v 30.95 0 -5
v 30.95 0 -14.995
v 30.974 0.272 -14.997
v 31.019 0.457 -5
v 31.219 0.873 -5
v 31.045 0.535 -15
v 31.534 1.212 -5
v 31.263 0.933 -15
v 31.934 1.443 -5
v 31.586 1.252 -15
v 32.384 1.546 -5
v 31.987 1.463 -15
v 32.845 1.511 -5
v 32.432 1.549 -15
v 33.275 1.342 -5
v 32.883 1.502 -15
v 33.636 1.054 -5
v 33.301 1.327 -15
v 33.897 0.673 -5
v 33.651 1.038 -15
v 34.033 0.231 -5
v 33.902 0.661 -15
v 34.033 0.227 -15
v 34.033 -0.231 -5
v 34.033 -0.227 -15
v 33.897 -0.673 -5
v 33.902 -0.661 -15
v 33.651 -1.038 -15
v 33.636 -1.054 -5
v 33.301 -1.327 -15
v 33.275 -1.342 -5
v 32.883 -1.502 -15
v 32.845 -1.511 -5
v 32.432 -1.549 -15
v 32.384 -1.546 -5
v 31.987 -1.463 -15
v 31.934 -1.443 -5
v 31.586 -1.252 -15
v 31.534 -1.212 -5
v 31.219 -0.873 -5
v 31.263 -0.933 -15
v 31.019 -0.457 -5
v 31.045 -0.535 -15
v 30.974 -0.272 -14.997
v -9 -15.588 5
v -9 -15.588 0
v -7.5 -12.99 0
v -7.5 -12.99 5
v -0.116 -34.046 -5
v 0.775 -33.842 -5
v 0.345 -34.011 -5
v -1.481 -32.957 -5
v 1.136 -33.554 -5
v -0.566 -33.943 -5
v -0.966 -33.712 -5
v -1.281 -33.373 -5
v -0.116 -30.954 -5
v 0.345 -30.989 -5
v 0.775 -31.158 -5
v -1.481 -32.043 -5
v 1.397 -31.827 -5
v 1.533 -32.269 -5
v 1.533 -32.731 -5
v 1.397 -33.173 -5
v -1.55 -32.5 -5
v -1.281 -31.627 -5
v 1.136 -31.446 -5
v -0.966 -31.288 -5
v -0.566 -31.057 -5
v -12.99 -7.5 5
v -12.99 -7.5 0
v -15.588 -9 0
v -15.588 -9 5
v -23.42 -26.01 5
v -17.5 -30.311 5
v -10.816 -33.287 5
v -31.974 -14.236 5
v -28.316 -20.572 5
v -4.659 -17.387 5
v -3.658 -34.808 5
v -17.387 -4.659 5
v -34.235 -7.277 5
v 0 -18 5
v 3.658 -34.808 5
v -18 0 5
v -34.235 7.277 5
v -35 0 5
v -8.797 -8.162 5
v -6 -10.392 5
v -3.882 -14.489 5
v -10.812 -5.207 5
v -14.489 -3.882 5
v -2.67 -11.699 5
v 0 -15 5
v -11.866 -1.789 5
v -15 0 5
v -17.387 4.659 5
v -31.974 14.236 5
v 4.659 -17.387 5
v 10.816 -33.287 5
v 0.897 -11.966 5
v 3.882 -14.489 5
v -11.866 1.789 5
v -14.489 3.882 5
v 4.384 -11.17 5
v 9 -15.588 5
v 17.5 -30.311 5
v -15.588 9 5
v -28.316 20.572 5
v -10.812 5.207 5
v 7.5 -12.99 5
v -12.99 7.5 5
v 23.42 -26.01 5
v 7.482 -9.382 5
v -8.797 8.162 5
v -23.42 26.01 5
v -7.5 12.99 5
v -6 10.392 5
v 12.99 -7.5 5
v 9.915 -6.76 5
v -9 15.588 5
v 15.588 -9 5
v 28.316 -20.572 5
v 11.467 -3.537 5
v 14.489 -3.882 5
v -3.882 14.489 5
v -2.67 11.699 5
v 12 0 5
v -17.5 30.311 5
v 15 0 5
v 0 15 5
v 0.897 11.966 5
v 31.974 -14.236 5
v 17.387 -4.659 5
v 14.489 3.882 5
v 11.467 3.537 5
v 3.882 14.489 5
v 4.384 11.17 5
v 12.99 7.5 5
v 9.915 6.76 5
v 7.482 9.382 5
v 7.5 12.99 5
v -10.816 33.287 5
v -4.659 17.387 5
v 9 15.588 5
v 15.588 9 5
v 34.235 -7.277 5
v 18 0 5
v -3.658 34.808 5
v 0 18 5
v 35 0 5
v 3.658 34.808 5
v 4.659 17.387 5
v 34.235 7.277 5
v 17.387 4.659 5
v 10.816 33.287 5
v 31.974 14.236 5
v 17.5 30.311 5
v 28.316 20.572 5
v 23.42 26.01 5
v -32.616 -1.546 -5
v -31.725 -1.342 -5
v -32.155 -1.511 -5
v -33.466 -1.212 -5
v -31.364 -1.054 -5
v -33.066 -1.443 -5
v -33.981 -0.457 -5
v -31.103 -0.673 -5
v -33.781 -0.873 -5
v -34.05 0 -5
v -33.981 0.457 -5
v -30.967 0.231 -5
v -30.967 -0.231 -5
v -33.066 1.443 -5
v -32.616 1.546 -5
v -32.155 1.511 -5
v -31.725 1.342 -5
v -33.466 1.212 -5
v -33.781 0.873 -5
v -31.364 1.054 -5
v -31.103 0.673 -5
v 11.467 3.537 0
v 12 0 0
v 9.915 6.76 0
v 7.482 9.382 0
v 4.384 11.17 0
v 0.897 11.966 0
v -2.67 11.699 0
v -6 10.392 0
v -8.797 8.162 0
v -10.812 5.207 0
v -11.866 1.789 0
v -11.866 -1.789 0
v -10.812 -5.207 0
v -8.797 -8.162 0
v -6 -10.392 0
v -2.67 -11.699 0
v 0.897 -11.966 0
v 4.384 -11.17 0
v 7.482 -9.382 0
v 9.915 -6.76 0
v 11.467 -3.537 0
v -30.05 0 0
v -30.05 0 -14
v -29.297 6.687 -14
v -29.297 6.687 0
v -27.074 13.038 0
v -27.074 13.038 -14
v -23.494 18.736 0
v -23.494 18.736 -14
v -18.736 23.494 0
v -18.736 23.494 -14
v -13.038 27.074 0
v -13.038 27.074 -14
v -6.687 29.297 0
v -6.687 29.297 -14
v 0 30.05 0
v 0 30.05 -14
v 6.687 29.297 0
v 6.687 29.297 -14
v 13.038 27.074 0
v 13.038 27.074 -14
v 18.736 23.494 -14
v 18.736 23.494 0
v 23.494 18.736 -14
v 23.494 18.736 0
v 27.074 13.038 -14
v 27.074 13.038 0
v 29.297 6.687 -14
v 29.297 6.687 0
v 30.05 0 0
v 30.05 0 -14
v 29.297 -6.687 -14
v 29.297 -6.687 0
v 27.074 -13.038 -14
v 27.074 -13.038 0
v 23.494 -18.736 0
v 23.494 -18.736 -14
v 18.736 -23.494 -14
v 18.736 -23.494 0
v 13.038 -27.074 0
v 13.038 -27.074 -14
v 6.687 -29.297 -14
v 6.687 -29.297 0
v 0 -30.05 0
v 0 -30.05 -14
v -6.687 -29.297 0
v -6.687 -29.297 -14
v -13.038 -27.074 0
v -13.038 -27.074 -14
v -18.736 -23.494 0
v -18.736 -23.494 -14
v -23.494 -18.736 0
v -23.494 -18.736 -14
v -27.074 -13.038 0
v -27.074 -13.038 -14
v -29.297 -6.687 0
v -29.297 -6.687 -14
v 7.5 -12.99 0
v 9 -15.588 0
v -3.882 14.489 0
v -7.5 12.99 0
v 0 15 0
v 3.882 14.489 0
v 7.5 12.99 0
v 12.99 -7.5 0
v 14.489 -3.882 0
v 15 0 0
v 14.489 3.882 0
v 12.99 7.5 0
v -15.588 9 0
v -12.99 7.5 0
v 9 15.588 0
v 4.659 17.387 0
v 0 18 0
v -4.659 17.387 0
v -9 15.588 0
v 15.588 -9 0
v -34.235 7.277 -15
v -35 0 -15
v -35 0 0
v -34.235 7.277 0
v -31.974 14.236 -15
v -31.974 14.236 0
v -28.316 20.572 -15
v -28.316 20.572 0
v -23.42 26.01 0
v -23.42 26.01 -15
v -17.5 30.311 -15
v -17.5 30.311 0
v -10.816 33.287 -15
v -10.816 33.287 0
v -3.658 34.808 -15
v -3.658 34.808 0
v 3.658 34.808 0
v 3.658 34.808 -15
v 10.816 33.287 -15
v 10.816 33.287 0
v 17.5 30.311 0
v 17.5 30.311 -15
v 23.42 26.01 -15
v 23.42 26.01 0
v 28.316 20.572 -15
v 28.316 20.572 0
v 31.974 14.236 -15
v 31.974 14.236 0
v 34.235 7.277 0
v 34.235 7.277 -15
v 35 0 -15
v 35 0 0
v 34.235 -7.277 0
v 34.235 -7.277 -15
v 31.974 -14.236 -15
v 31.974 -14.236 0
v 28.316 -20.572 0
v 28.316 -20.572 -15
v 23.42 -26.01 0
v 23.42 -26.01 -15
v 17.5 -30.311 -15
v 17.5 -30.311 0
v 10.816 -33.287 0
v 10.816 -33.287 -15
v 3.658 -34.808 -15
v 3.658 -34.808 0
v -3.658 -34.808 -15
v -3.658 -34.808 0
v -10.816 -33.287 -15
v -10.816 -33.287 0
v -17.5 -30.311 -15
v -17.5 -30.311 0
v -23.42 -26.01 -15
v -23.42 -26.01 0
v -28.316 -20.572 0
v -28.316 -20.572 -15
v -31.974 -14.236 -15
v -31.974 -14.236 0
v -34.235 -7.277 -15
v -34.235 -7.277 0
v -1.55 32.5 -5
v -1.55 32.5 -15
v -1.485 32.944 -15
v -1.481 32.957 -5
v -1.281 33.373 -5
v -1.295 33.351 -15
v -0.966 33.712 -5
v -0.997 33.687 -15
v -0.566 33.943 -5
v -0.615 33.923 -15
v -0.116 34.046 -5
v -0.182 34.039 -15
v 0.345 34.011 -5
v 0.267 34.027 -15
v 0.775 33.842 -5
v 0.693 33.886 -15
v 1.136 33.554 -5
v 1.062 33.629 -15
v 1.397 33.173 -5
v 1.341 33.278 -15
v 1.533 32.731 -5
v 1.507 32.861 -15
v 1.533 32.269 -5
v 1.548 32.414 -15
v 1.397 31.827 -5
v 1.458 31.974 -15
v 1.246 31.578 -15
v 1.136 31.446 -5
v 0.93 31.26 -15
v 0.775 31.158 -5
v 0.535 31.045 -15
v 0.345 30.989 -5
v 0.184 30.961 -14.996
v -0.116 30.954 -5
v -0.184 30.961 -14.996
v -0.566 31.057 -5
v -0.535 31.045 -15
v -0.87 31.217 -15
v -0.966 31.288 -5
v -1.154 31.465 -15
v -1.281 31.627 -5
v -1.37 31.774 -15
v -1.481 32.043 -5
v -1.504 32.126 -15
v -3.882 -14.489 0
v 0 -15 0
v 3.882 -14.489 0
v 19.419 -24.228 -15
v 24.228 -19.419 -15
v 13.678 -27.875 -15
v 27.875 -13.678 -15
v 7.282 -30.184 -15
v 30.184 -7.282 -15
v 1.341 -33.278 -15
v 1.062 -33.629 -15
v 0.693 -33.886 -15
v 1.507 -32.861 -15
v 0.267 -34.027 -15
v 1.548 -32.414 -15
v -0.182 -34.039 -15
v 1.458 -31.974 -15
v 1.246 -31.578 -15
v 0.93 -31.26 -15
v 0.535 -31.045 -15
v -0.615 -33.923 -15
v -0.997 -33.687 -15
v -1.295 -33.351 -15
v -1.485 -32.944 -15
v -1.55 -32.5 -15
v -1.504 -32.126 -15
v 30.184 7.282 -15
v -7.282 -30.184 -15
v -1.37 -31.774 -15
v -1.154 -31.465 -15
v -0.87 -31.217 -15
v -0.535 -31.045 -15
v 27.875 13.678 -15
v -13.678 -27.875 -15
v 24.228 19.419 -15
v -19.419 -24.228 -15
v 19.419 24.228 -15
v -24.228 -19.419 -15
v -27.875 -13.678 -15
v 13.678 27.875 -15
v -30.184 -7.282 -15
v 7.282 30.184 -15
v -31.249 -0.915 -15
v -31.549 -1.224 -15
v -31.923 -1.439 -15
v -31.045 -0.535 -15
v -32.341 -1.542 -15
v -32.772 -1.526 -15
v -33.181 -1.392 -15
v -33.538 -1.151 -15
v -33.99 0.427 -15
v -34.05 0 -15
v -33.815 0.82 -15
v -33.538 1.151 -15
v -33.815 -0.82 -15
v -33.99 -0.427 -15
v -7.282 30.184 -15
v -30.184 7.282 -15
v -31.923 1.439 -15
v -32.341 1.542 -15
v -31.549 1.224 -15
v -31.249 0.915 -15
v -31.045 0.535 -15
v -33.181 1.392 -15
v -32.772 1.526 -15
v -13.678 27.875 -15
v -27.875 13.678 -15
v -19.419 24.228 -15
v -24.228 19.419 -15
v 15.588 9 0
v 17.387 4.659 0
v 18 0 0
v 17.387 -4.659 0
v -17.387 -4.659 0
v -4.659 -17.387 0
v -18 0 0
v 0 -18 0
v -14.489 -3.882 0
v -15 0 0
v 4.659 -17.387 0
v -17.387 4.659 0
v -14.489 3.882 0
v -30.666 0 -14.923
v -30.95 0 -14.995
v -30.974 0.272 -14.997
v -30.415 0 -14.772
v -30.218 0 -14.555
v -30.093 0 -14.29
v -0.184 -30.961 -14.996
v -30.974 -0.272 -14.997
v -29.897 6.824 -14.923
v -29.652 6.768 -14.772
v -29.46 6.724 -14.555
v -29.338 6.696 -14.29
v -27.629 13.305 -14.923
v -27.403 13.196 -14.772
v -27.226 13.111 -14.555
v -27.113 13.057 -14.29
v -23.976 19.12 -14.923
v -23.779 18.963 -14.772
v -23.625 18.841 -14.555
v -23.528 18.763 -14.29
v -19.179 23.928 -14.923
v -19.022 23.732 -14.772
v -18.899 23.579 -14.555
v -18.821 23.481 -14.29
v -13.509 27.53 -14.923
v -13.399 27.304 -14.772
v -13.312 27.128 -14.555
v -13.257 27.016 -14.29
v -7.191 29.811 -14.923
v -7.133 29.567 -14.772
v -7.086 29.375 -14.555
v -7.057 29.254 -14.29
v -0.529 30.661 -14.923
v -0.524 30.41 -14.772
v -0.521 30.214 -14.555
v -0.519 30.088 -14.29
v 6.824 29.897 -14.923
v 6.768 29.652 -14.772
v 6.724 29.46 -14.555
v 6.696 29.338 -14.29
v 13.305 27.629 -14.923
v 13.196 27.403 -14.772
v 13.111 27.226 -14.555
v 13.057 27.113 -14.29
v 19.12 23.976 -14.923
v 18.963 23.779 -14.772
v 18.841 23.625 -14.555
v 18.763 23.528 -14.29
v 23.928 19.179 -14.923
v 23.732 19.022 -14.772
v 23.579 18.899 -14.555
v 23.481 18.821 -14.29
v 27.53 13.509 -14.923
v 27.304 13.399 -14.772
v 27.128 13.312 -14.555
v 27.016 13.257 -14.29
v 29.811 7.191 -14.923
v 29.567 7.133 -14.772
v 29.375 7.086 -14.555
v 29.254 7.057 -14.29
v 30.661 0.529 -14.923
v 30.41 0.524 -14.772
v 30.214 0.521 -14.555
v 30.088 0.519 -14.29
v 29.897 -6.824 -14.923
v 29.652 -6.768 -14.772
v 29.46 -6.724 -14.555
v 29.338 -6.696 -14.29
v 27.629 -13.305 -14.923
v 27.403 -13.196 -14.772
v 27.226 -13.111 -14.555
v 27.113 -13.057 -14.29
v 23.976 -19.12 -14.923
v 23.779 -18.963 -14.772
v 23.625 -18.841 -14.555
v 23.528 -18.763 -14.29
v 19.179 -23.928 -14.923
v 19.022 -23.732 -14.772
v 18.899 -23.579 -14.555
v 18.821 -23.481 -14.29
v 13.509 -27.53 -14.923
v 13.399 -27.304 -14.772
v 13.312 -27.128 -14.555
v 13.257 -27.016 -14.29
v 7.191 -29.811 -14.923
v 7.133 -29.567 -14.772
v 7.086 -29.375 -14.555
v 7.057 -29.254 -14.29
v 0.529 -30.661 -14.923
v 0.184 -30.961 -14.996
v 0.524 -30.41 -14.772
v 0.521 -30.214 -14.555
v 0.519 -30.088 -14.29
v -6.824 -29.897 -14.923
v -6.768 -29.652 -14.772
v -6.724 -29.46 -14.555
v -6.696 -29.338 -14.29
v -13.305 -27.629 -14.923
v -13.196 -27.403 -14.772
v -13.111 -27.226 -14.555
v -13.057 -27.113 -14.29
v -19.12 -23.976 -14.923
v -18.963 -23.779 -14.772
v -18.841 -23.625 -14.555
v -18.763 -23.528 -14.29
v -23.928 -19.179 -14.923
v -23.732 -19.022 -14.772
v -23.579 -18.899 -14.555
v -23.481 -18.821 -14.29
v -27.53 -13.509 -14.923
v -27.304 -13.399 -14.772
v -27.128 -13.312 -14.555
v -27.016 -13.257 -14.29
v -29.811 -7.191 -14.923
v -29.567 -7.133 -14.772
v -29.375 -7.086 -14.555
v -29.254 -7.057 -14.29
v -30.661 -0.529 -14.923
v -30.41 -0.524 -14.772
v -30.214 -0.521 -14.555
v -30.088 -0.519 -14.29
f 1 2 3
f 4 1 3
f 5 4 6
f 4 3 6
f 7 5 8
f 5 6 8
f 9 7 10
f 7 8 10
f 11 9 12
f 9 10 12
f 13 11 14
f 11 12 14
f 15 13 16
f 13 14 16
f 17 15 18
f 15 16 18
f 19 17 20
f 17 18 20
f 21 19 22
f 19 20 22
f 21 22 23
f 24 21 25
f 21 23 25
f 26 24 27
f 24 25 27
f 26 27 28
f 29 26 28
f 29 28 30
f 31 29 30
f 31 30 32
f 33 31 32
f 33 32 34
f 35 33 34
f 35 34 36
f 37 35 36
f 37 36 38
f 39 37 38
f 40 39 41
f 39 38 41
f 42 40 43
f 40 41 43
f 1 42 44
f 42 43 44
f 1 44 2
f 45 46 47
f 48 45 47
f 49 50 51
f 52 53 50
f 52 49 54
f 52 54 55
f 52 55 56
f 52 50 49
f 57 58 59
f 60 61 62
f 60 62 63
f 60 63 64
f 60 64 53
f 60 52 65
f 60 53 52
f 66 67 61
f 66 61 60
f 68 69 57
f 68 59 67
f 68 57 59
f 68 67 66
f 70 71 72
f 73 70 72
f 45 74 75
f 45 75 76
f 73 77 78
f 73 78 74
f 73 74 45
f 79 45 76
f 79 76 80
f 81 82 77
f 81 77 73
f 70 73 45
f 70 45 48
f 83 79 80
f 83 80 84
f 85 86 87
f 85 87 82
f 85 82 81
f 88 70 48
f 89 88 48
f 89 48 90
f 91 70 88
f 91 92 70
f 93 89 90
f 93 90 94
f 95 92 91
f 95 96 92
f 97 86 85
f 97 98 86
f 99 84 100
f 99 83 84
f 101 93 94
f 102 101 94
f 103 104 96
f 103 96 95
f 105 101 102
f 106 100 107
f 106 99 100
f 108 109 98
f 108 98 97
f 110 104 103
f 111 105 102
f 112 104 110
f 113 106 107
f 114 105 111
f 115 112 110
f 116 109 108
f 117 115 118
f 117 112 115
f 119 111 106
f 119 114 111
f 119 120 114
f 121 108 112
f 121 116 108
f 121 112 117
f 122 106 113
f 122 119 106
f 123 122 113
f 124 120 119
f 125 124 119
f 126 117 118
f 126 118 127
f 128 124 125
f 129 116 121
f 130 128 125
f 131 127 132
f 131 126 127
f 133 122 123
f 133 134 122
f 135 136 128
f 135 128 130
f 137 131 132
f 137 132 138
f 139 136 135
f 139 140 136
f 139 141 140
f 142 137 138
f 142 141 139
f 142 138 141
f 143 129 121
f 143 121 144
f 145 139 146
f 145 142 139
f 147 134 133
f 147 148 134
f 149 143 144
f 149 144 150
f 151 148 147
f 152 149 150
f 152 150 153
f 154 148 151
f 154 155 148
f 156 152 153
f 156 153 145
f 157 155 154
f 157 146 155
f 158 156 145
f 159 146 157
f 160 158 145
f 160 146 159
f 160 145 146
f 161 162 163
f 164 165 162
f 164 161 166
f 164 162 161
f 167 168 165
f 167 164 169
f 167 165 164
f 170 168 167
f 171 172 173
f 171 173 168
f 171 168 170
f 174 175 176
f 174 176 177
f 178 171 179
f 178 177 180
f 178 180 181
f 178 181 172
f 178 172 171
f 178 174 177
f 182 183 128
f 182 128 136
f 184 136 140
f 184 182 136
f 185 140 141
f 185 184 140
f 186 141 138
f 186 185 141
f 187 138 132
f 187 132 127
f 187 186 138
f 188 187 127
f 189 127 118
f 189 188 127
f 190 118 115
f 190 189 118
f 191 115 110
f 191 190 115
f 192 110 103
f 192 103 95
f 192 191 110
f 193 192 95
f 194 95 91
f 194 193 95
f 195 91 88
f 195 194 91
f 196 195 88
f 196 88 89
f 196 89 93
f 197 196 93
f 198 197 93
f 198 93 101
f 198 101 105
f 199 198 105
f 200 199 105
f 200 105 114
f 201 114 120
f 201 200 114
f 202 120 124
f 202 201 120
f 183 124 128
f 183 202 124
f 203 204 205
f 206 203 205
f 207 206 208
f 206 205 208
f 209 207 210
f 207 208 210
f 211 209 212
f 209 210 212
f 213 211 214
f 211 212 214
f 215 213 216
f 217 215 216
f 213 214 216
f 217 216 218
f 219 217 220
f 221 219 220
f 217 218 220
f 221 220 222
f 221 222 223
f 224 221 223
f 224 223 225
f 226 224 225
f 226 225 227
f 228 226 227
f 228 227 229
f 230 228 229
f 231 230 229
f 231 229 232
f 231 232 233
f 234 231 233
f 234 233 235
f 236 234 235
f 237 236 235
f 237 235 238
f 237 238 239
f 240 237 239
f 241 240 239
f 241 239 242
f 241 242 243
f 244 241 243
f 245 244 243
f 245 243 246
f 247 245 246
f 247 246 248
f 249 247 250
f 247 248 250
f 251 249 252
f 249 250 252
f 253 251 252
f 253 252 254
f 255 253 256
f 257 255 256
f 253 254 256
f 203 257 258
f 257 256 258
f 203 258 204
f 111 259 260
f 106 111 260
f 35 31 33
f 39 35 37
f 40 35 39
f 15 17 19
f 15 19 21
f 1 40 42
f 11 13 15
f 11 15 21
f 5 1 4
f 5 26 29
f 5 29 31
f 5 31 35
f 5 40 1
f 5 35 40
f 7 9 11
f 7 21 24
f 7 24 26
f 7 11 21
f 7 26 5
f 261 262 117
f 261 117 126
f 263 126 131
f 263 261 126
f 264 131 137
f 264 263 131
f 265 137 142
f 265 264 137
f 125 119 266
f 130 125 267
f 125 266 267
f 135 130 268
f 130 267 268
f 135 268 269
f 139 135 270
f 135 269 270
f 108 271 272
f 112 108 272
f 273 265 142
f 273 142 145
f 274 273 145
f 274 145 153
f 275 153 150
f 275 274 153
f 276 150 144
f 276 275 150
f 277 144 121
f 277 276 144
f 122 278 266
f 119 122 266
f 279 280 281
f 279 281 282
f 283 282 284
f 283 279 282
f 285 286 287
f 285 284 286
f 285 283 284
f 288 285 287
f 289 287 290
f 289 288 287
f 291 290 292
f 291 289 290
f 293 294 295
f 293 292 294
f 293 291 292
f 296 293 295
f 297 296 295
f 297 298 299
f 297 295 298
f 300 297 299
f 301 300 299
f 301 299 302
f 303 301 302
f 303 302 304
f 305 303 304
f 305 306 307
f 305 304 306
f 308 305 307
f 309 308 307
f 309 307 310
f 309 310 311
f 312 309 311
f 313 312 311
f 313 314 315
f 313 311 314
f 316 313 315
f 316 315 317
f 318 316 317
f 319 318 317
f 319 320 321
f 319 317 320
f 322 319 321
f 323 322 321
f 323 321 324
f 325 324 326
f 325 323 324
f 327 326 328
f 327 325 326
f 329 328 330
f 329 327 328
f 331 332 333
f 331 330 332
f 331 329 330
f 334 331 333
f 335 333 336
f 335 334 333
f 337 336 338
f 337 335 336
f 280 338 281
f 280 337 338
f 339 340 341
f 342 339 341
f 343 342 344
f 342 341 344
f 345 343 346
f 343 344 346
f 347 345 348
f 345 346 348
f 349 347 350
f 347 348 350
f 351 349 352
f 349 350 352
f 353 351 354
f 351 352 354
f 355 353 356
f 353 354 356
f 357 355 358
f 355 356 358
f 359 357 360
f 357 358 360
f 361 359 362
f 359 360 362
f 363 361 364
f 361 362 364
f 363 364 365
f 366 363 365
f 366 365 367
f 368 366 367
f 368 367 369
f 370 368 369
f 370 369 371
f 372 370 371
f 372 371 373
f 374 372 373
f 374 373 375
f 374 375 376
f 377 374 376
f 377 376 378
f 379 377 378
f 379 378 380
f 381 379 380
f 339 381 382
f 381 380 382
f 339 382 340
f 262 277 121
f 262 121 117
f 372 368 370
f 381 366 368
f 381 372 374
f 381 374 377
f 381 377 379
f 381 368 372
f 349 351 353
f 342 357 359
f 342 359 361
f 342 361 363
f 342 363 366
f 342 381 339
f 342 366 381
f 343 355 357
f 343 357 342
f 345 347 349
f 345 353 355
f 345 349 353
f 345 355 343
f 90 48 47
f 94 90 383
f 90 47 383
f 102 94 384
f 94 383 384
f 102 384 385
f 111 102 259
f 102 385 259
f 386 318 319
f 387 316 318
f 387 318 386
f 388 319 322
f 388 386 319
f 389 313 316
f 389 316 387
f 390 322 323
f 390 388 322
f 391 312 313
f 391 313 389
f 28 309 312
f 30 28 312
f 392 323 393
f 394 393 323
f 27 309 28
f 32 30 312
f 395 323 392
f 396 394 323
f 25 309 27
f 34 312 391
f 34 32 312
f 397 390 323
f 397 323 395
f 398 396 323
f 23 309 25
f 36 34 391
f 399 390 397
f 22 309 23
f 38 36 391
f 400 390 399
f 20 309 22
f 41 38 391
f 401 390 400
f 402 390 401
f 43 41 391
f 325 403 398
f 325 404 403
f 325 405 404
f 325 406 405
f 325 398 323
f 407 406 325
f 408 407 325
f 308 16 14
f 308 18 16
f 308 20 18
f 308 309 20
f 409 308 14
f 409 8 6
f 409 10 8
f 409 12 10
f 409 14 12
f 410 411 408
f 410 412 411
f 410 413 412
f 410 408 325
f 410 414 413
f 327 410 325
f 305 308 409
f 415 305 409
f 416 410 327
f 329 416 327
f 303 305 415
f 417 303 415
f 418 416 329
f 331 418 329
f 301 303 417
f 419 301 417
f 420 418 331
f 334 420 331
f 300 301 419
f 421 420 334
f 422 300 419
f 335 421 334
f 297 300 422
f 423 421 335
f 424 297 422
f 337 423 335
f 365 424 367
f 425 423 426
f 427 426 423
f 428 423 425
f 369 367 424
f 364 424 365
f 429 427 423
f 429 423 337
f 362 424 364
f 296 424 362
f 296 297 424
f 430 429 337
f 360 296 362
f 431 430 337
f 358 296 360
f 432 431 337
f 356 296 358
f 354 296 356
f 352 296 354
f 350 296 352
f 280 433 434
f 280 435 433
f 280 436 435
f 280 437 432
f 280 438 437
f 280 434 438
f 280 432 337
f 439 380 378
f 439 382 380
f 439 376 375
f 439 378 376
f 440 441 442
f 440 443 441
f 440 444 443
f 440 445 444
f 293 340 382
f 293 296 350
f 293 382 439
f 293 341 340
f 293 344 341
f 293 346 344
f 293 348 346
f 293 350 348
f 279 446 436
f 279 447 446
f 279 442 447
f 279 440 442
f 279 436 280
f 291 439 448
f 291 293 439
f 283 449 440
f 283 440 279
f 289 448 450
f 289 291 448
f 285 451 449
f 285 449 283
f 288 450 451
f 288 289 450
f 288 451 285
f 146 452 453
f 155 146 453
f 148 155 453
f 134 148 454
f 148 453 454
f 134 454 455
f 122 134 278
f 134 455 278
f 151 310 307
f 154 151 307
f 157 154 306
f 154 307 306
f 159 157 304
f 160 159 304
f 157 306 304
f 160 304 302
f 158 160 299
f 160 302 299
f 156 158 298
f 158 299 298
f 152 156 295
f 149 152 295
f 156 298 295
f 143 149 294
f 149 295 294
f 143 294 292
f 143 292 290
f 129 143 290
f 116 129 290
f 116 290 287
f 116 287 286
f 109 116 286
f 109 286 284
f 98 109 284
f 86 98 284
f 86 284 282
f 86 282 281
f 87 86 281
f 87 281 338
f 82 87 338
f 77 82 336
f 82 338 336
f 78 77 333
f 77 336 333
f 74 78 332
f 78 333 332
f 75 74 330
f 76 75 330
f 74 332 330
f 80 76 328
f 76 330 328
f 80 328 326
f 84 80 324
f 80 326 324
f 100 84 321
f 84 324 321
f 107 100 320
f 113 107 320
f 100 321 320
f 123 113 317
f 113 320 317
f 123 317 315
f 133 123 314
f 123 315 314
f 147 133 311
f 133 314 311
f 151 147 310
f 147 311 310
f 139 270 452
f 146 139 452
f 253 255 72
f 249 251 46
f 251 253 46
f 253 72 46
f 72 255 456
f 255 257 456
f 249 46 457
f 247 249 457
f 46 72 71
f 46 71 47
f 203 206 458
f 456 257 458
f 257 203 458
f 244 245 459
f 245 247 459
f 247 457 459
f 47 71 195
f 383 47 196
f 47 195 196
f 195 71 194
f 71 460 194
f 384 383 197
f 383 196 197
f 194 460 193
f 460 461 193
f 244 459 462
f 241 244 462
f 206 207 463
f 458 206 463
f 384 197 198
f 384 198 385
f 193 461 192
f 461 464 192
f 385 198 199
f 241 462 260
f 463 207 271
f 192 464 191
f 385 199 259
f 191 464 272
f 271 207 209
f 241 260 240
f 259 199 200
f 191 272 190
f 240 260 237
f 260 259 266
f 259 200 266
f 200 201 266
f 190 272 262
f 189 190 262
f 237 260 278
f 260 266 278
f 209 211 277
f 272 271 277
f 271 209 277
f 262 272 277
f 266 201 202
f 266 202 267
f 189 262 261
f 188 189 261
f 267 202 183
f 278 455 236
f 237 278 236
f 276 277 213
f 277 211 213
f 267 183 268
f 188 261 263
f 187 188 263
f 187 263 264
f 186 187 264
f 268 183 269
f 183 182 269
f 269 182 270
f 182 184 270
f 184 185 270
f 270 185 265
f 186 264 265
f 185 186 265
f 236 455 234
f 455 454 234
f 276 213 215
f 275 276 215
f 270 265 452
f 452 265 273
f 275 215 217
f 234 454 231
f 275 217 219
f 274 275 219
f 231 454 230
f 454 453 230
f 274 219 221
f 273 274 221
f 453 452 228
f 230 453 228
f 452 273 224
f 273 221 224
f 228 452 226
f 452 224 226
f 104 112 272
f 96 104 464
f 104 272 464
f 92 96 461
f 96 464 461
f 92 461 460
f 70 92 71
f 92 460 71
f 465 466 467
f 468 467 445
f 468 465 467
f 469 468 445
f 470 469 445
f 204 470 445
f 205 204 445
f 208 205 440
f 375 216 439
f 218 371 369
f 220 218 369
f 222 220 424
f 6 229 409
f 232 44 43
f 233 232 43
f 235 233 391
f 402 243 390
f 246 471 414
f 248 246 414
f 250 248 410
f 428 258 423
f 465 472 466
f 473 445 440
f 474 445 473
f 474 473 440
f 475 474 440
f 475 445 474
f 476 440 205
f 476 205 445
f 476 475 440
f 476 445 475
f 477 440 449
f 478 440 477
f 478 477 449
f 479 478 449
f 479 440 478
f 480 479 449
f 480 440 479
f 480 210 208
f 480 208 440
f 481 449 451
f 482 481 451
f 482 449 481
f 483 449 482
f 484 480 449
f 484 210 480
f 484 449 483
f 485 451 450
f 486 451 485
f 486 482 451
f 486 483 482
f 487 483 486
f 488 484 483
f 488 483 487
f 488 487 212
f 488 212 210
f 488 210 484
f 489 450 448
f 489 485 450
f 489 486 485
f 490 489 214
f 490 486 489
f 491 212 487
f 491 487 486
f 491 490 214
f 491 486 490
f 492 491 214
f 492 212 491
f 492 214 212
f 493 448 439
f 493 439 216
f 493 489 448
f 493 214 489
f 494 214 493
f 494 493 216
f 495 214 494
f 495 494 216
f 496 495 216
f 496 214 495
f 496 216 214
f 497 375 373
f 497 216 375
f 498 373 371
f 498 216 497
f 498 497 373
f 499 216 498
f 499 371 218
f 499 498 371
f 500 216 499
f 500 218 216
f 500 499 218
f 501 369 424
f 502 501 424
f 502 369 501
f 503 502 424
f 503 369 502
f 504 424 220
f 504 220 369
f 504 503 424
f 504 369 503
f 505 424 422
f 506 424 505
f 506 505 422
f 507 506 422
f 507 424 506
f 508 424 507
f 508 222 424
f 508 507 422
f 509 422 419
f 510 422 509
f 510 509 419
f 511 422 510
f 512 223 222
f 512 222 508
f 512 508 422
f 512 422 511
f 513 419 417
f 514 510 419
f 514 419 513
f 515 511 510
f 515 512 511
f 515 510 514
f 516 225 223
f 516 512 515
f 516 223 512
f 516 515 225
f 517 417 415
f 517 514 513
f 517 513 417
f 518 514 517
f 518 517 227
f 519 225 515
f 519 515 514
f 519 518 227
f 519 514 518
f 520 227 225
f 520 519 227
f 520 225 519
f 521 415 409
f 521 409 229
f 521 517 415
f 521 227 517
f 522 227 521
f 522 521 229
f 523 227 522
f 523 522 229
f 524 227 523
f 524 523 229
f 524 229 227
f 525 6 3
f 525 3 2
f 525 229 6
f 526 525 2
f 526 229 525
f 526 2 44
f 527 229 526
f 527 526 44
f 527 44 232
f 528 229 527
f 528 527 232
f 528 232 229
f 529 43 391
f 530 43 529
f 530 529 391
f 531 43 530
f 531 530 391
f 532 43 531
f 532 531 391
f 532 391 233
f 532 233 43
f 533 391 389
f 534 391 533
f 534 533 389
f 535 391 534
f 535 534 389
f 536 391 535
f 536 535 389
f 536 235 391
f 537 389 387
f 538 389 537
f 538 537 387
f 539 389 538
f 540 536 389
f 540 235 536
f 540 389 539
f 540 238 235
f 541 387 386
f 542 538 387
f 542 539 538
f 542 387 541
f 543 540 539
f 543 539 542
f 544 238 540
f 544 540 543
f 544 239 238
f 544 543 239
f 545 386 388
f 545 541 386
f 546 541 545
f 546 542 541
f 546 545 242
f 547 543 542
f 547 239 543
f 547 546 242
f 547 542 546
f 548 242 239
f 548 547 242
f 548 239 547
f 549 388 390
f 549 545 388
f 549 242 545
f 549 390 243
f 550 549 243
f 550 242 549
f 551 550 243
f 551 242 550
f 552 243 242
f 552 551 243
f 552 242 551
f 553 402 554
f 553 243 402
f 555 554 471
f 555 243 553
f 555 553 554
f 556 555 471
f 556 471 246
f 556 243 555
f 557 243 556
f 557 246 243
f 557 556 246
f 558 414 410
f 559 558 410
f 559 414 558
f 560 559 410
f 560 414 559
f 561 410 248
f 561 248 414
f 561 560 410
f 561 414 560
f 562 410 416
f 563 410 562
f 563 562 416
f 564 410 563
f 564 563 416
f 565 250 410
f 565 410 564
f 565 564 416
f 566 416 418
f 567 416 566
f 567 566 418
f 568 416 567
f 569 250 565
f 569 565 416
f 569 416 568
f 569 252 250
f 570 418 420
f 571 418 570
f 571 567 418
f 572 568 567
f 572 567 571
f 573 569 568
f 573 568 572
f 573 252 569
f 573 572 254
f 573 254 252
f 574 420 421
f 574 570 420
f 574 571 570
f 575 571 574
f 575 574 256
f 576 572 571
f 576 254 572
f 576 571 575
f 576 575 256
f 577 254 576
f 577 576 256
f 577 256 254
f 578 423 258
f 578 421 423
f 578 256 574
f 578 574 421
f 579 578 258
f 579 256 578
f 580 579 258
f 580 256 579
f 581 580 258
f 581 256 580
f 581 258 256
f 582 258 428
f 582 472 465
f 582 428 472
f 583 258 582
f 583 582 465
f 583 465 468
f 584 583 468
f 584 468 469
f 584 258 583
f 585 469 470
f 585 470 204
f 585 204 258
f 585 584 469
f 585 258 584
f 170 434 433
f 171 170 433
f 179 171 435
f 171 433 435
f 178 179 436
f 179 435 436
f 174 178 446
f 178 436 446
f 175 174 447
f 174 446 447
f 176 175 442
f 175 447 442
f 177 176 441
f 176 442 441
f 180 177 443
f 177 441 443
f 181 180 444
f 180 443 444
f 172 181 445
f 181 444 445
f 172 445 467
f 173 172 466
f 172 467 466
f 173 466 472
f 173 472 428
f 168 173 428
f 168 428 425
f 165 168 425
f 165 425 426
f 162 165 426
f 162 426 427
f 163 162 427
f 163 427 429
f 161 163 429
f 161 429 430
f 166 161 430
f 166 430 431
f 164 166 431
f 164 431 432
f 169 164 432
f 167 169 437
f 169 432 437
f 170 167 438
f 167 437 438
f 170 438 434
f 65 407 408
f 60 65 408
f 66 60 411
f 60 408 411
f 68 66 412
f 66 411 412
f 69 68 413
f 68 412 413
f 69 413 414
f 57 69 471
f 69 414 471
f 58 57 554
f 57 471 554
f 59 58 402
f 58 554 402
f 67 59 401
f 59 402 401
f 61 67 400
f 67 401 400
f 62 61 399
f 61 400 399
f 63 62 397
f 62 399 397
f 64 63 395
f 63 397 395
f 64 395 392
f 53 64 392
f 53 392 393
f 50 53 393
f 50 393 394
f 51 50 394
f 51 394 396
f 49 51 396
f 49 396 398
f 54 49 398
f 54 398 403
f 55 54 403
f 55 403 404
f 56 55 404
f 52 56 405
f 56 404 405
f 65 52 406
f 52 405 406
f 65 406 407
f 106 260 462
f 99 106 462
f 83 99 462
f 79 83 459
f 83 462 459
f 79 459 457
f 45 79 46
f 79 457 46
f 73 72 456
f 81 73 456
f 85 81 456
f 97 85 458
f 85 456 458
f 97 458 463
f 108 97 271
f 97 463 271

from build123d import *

# Parameters (mm, degrees)
SKETCH_2_R          = 35
SKETCH_2_R_2        = 12
EXTRUDE_1_DEPTH     = 5
EXTRUDE_START       = 15
SKETCH_3_R          = 35
SKETCH_3_R_2        = 30.05
EXTRUDE_2_DEPTH     = 15
SKETCH_4_R          = 1.55
CUT_EXTRUDE_1_DEPTH = 10
FILLET_1_R          = 1
CUT_EXTRUDE_2_DEPTH = 52.720402193


with BuildPart() as part:
    # 草图2 → 凸台-拉伸1 (new body)
    with BuildSketch(Plane.XY):
        Circle(SKETCH_2_R)
        Circle(SKETCH_2_R_2, mode=Mode.SUBTRACT)
    extrude(amount=EXTRUDE_1_DEPTH)

    # 草图3 → 凸台-拉伸2 (add)
    with BuildSketch(Plane(origin=(0, 0, 0), x_dir=(-1, 0, 0), z_dir=(0, 0, -1)).offset(EXTRUDE_START)):
        Circle(SKETCH_3_R)
        Circle(SKETCH_3_R_2, mode=Mode.SUBTRACT)
    extrude(amount=-EXTRUDE_2_DEPTH)

    # 草图4 → 切除-拉伸1 (cut)
    with BuildSketch(Plane(origin=(0, 0, -15), x_dir=(-1, 0, 0), z_dir=(0, 0, -1))):
        with Locations((0, 32.5)):
            Circle(SKETCH_4_R)
        with Locations((32.5, 0)):
            Circle(SKETCH_4_R)
        with Locations((0, -32.5)):
            Circle(SKETCH_4_R)
        with Locations((-32.5, 0)):
            Circle(SKETCH_4_R)
    extrude(amount=-CUT_EXTRUDE_1_DEPTH, mode=Mode.SUBTRACT)

    # 圆角1
    # the kernel refuses this fillet: 1 mm, written as the material it takes off along each edge
    with BuildSketch(Plane(origin=(0, 0, -15), x_dir=(-1, 0, 0), z_dir=(0, -1, 0))) as fillet_1_piece_1:
        with BuildLine():
            CenterArc((30.05 + FILLET_1_R, -FILLET_1_R), FILLET_1_R, 90, 90)
            Line((30.05, -FILLET_1_R), (30.05, 0))
            Line((30.05, 0), (30.05 + FILLET_1_R, 0))
        make_face()
    revolve(axis=Axis((0, 0, -15), (0, 0, -1)), mode=Mode.SUBTRACT)

    # 草图5 → 切除-拉伸2 (cut, through all)
    with BuildSketch(Plane(origin=(0, 0, 0), x_dir=(-1, 0, 0), z_dir=(0, 0, -1))):
        with BuildLine():
            Line((12.990381057, -7.5), (15.588457268, -9))
            ThreePointArc((15.588457268, -9), (18, 0), (15.588457268, 9))
            Line((15.588457268, 9), (12.990381057, 7.5))
            ThreePointArc((12.990381057, 7.5), (15, 0), (12.990381057, -7.5))
        make_face()
        with BuildLine():
            Line((-7.5, 12.990381057), (-9, 15.588457268))
            ThreePointArc((-9, 15.588457268), (0, 18), (9, 15.588457268))
            Line((9, 15.588457268), (7.5, 12.990381057))
            ThreePointArc((7.5, 12.990381057), (0, 15), (-7.5, 12.990381057))
        make_face()
        with BuildLine():
            Line((-7.5, -12.990381057), (-9, -15.588457268))
            ThreePointArc((-9, -15.588457268), (0, -18), (9, -15.588457268))
            Line((9, -15.588457268), (7.5, -12.990381057))
            ThreePointArc((7.5, -12.990381057), (0, -15), (-7.5, -12.990381057))
        make_face()
        with BuildLine():
            Line((-12.990381057, 7.5), (-15.588457268, 9))
            ThreePointArc((-15.588457268, 9), (-18, 0), (-15.588457268, -9))
            Line((-15.588457268, -9), (-12.990381057, -7.5))
            ThreePointArc((-12.990381057, -7.5), (-15, 0), (-12.990381057, 7.5))
        make_face()
    extrude(amount=-CUT_EXTRUDE_2_DEPTH, mode=Mode.SUBTRACT)


solid = part.part
